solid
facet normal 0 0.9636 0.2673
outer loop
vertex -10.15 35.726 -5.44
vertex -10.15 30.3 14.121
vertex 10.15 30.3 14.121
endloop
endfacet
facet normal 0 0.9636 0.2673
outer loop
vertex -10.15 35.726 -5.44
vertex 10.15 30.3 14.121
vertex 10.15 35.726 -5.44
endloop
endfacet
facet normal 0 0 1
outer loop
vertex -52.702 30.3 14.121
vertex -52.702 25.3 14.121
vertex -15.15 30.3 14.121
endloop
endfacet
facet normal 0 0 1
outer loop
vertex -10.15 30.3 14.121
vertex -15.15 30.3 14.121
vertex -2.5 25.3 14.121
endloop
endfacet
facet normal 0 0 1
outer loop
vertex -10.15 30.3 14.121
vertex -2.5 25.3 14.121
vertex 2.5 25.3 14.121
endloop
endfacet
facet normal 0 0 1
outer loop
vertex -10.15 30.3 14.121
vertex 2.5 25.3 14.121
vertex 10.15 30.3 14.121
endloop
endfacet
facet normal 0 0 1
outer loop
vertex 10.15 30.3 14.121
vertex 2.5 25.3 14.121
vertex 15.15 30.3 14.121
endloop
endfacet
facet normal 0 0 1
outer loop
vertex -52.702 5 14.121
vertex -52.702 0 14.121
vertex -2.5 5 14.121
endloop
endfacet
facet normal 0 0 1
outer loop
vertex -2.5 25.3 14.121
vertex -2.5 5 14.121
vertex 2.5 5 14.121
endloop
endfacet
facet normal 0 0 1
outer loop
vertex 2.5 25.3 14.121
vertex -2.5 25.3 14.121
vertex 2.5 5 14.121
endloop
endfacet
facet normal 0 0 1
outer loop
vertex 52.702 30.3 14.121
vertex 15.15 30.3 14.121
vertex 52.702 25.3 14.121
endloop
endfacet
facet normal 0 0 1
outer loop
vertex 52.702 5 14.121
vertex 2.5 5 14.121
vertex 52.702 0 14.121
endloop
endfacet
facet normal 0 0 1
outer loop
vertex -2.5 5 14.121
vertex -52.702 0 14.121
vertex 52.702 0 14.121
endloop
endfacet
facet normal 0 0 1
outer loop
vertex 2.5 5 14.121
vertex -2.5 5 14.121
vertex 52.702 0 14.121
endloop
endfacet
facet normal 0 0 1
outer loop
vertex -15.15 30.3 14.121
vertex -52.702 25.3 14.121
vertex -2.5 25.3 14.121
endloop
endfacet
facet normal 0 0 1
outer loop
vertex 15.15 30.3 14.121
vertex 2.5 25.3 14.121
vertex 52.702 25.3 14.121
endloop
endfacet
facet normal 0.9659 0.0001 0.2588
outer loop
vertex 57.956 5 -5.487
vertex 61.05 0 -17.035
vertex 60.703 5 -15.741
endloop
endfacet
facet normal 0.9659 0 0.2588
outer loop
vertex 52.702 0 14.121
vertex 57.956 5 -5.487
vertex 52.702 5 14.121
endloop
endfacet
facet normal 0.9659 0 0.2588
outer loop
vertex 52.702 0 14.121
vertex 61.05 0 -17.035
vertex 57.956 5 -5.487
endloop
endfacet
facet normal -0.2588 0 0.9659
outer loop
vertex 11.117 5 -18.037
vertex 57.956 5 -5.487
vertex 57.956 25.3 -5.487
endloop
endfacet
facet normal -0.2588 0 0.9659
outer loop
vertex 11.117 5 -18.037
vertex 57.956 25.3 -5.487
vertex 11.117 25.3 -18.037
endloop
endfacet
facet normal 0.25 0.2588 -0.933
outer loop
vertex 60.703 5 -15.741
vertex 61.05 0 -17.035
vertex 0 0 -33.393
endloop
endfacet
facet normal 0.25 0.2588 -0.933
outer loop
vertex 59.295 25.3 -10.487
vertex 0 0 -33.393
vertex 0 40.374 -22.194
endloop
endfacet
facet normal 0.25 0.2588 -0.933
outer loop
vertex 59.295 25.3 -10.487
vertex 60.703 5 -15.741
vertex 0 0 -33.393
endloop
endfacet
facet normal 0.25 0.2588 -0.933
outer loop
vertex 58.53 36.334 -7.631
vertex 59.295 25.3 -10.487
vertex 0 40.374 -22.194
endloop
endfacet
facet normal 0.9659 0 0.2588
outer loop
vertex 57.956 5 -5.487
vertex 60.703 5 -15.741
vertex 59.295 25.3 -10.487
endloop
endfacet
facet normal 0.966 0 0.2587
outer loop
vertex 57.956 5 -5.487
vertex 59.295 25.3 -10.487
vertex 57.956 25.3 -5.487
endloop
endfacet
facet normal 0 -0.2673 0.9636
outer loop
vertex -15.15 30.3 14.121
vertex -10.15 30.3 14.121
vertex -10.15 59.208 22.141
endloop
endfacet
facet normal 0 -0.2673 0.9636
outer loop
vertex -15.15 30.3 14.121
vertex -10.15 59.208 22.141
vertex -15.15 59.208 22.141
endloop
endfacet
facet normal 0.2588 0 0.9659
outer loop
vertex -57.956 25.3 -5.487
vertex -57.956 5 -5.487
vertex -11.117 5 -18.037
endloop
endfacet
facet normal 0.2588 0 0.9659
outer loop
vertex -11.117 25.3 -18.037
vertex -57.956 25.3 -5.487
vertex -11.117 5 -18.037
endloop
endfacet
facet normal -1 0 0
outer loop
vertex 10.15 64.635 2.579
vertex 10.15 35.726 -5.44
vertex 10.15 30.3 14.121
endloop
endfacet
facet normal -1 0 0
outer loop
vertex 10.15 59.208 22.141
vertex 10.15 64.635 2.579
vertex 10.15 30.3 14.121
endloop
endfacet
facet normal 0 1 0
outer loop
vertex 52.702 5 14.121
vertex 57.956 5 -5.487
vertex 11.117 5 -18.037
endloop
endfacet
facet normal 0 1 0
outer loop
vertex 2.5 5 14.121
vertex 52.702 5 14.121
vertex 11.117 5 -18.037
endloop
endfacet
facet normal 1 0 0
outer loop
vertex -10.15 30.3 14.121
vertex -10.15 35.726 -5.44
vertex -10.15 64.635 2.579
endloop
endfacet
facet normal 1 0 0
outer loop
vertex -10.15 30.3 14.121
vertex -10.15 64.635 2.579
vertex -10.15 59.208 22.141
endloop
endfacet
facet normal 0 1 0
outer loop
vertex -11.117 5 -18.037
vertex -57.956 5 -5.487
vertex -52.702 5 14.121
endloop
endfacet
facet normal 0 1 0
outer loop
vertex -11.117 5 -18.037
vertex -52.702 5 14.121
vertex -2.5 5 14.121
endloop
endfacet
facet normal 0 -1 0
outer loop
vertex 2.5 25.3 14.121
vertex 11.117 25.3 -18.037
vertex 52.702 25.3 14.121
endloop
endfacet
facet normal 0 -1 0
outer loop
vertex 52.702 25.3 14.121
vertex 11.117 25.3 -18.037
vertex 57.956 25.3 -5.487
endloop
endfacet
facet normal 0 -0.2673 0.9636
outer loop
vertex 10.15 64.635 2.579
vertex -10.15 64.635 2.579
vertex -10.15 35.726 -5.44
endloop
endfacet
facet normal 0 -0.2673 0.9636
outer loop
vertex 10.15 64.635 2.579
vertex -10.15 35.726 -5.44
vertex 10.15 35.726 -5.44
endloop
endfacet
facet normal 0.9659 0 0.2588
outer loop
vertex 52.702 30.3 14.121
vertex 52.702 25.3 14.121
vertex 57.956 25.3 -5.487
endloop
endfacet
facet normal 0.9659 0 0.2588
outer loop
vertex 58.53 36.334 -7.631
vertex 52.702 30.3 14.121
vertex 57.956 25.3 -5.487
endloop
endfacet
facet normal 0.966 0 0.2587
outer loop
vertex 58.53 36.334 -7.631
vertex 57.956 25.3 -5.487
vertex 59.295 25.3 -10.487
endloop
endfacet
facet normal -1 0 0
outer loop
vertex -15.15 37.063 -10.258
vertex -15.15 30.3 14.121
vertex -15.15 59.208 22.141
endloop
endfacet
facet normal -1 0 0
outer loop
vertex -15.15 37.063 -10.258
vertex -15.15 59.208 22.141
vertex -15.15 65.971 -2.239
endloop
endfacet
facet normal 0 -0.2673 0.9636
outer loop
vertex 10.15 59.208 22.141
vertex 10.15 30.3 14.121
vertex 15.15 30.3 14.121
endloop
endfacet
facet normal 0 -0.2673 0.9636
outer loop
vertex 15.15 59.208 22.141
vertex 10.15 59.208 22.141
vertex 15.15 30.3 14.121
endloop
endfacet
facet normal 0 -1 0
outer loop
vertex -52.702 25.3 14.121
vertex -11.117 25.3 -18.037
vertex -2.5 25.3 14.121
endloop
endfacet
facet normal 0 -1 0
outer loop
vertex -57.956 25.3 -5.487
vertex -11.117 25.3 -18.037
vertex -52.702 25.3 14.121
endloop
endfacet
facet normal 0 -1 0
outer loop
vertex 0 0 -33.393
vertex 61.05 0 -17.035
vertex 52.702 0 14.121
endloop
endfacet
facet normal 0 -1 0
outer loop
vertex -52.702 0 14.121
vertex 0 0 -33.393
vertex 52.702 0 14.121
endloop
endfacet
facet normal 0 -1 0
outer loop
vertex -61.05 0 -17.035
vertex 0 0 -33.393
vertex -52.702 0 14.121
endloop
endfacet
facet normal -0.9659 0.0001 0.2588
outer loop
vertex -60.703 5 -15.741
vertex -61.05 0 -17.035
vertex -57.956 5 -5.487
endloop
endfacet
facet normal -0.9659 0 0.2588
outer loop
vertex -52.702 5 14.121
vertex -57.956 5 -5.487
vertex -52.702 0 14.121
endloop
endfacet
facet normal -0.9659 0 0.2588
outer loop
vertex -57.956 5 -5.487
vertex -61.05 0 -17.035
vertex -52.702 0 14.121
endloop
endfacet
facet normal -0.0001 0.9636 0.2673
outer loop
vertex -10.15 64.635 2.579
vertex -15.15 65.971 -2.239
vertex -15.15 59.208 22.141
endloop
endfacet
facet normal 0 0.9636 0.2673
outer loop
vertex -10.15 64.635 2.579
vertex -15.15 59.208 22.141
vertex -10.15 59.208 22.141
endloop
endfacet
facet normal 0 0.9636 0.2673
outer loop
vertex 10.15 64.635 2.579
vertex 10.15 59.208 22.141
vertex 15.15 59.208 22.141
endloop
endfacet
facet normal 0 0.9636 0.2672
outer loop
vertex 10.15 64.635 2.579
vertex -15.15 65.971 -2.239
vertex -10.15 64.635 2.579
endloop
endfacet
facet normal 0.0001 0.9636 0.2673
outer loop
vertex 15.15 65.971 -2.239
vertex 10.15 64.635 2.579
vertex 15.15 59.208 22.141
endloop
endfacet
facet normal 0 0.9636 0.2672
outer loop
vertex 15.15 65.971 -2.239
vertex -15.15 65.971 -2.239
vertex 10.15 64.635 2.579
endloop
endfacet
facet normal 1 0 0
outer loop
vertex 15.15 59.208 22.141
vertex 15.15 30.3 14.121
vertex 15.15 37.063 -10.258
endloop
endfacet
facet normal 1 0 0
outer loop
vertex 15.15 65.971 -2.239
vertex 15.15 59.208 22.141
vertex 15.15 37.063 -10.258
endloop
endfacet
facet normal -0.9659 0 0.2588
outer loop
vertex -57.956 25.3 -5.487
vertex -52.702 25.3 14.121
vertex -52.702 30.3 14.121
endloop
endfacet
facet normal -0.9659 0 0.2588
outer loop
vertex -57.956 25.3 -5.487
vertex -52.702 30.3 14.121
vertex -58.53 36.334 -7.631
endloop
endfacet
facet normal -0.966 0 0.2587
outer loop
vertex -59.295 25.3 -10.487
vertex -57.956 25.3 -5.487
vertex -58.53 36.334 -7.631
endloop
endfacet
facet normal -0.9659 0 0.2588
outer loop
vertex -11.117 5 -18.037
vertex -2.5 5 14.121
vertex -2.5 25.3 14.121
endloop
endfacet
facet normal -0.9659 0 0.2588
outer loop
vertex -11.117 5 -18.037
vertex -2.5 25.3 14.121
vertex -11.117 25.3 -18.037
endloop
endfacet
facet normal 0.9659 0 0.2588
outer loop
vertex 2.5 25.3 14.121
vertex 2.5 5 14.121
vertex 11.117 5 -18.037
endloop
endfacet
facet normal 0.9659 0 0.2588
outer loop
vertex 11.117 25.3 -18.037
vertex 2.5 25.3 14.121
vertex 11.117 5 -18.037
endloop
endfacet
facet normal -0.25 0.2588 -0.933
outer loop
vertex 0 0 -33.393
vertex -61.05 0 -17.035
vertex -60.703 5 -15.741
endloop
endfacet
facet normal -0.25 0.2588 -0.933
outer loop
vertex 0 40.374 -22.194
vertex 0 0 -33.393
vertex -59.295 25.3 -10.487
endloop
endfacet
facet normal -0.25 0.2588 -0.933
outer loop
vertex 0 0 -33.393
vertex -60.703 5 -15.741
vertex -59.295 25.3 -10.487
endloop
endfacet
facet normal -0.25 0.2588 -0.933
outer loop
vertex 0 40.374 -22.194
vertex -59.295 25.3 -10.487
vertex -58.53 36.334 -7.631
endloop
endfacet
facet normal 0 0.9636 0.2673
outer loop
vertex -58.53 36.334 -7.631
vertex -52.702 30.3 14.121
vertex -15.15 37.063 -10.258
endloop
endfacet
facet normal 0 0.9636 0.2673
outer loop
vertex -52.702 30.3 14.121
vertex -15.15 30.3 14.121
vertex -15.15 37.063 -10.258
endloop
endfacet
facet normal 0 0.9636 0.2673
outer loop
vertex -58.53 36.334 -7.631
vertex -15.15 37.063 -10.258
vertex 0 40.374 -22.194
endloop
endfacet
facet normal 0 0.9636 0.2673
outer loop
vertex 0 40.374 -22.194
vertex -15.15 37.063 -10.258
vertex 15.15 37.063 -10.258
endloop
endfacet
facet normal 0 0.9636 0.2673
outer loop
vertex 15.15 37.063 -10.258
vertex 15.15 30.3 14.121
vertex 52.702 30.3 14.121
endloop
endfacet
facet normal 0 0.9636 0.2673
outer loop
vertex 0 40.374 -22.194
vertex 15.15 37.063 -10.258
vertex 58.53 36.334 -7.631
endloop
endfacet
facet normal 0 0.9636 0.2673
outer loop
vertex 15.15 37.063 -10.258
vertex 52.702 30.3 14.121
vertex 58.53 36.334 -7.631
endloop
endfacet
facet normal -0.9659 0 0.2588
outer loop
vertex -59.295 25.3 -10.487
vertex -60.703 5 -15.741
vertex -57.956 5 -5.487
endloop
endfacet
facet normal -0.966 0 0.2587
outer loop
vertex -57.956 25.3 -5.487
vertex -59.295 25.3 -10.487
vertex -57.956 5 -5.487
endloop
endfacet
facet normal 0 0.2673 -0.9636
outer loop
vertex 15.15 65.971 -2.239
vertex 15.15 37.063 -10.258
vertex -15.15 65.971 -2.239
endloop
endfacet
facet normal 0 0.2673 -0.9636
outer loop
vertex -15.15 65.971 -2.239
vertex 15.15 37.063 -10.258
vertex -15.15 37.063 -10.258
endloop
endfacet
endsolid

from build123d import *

# Parameters (mm, degrees)
BOSS_EXTRUDE5_DEPTH  = 5
BOSS_EXTRUDE6_DEPTH  = 20.3
BOSS_EXTRUDE7_DEPTH  = 20
CUT_EXTRUDE1_DEPTH   = 90.151426067
CUT_EXTRUDE3_DEPTH   = 84.031866845
BOSS_EXTRUDE9_DEPTH  = 30
BOSS_EXTRUDE11_DEPTH = 20.3


with BuildPart() as part:
    # Sketch8 → Boss-Extrude5 (new body)
    with BuildSketch(Plane(origin=(0, 0, 0), x_dir=(1, 0, 0), z_dir=(0, 1, 0))):
        Polygon((-63.131930479, 24.805480282), (-52.701522962, -14.121330517), (0, -14.121330517), (0, 41.721630071), align=None)
    boss_extrude5 = extrude(amount=BOSS_EXTRUDE5_DEPTH)

    # Sketch9 → Boss-Extrude6 (add)
    with BuildSketch(Plane(origin=(0, 5, 0), x_dir=(1, 0, 0), z_dir=(0, 1, 0))):
        Polygon((-63.131930479, 24.805480282), (-57.955549577, 5.486963756), (0, 21.016106462), (0, 41.721630071), align=None)
    boss_extrude6 = extrude(amount=BOSS_EXTRUDE6_DEPTH)

    # Sketch10 → Boss-Extrude7 (add)
    with BuildSketch(Plane(origin=(0, 25.3, 0), x_dir=(1, 0, 0), z_dir=(0, 1, 0))):
        Polygon((0, 41.721630071), (0, -14.121330517), (-52.701522962, -14.121330517), (-63.131930479, 24.805480282), align=None)
    boss_extrude7 = extrude(amount=BOSS_EXTRUDE7_DEPTH)

    # Sketch19 → Cut-Extrude1 (cut, through all)
    with BuildSketch(Plane(origin=(-52.701522962, 0, 14.121330517), x_dir=(0.25881904510251774, 0, 0.9659258262890692), z_dir=(-0.9659258262890692, 0, 0.25881904510251774))):
        Polygon((-32.255495471, 0), (-20.117397053, 45.3), (-40.3, 45.3), (-40.3, 0), align=None)
    cut_extrude1 = extrude(amount=-CUT_EXTRUDE1_DEPTH, mode=Mode.SUBTRACT)

    # Sketch22 → Cut-Extrude3 (cut, through all)
    with BuildSketch(Plane(origin=(0, 0, 0), x_dir=(0, 0, -1), z_dir=(1, 0, 0))):
        Polygon((-14.121330517, 30.3), (22.193593674, 40.37381141), (20.827061981, 45.3), (-14.121330517, 45.3), align=None)
    cut_extrude3 = extrude(amount=-CUT_EXTRUDE3_DEPTH, mode=Mode.SUBTRACT)

    # Sketch23 → Boss-Extrude9 (add)
    with BuildSketch(Plane(origin=(0, 31.772345951, 8.813693772), x_dir=(1, 0, 0), z_dir=(0, 0.9636113749942826, 0.26730716036355656))):
        Polygon((-10.15, -5.508067758), (-15.15, -5.508067758), (-15.15, 19.791932242), (0, 19.791932242), (0, 14.791932242), (-10.15, 14.791932242), align=None)
    boss_extrude9 = extrude(amount=BOSS_EXTRUDE9_DEPTH)

    # Sketch24 → Boss-Extrude11 (add)
    with BuildSketch(Plane(origin=(0, 5, 0), x_dir=(1, 0, 0), z_dir=(0, 1, 0))):
        Polygon((-2.5, -14.121330517), (-11.116891, 18.037344497), (0, 21.016106462), (0, -14.121330517), align=None)
    boss_extrude11 = extrude(amount=BOSS_EXTRUDE11_DEPTH)

    # Mirror1: Boss-Extrude5, Boss-Extrude6, Boss-Extrude7, Cut-Extrude1, Cut-Extrude3, Boss-Extrude9, Boss-Extrude11 across plane
    add(boss_extrude5.mirror(Plane(origin=(0, 5, -41.721630071), x_dir=(0, 0, 1), z_dir=(-1, 0, 0))))
    add(boss_extrude6.mirror(Plane(origin=(0, 5, -41.721630071), x_dir=(0, 0, 1), z_dir=(-1, 0, 0))))
    add(boss_extrude7.mirror(Plane(origin=(0, 5, -41.721630071), x_dir=(0, 0, 1), z_dir=(-1, 0, 0))))
    add(cut_extrude1.mirror(Plane(origin=(0, 5, -41.721630071), x_dir=(0, 0, 1), z_dir=(-1, 0, 0))), mode=Mode.SUBTRACT)
    add(cut_extrude3.mirror(Plane(origin=(0, 5, -41.721630071), x_dir=(0, 0, 1), z_dir=(-1, 0, 0))), mode=Mode.SUBTRACT)
    add(boss_extrude9.mirror(Plane(origin=(0, 5, -41.721630071), x_dir=(0, 0, 1), z_dir=(-1, 0, 0))))
    add(boss_extrude11.mirror(Plane(origin=(0, 5, -41.721630071), x_dir=(0, 0, 1), z_dir=(-1, 0, 0))))


solid = part.part
